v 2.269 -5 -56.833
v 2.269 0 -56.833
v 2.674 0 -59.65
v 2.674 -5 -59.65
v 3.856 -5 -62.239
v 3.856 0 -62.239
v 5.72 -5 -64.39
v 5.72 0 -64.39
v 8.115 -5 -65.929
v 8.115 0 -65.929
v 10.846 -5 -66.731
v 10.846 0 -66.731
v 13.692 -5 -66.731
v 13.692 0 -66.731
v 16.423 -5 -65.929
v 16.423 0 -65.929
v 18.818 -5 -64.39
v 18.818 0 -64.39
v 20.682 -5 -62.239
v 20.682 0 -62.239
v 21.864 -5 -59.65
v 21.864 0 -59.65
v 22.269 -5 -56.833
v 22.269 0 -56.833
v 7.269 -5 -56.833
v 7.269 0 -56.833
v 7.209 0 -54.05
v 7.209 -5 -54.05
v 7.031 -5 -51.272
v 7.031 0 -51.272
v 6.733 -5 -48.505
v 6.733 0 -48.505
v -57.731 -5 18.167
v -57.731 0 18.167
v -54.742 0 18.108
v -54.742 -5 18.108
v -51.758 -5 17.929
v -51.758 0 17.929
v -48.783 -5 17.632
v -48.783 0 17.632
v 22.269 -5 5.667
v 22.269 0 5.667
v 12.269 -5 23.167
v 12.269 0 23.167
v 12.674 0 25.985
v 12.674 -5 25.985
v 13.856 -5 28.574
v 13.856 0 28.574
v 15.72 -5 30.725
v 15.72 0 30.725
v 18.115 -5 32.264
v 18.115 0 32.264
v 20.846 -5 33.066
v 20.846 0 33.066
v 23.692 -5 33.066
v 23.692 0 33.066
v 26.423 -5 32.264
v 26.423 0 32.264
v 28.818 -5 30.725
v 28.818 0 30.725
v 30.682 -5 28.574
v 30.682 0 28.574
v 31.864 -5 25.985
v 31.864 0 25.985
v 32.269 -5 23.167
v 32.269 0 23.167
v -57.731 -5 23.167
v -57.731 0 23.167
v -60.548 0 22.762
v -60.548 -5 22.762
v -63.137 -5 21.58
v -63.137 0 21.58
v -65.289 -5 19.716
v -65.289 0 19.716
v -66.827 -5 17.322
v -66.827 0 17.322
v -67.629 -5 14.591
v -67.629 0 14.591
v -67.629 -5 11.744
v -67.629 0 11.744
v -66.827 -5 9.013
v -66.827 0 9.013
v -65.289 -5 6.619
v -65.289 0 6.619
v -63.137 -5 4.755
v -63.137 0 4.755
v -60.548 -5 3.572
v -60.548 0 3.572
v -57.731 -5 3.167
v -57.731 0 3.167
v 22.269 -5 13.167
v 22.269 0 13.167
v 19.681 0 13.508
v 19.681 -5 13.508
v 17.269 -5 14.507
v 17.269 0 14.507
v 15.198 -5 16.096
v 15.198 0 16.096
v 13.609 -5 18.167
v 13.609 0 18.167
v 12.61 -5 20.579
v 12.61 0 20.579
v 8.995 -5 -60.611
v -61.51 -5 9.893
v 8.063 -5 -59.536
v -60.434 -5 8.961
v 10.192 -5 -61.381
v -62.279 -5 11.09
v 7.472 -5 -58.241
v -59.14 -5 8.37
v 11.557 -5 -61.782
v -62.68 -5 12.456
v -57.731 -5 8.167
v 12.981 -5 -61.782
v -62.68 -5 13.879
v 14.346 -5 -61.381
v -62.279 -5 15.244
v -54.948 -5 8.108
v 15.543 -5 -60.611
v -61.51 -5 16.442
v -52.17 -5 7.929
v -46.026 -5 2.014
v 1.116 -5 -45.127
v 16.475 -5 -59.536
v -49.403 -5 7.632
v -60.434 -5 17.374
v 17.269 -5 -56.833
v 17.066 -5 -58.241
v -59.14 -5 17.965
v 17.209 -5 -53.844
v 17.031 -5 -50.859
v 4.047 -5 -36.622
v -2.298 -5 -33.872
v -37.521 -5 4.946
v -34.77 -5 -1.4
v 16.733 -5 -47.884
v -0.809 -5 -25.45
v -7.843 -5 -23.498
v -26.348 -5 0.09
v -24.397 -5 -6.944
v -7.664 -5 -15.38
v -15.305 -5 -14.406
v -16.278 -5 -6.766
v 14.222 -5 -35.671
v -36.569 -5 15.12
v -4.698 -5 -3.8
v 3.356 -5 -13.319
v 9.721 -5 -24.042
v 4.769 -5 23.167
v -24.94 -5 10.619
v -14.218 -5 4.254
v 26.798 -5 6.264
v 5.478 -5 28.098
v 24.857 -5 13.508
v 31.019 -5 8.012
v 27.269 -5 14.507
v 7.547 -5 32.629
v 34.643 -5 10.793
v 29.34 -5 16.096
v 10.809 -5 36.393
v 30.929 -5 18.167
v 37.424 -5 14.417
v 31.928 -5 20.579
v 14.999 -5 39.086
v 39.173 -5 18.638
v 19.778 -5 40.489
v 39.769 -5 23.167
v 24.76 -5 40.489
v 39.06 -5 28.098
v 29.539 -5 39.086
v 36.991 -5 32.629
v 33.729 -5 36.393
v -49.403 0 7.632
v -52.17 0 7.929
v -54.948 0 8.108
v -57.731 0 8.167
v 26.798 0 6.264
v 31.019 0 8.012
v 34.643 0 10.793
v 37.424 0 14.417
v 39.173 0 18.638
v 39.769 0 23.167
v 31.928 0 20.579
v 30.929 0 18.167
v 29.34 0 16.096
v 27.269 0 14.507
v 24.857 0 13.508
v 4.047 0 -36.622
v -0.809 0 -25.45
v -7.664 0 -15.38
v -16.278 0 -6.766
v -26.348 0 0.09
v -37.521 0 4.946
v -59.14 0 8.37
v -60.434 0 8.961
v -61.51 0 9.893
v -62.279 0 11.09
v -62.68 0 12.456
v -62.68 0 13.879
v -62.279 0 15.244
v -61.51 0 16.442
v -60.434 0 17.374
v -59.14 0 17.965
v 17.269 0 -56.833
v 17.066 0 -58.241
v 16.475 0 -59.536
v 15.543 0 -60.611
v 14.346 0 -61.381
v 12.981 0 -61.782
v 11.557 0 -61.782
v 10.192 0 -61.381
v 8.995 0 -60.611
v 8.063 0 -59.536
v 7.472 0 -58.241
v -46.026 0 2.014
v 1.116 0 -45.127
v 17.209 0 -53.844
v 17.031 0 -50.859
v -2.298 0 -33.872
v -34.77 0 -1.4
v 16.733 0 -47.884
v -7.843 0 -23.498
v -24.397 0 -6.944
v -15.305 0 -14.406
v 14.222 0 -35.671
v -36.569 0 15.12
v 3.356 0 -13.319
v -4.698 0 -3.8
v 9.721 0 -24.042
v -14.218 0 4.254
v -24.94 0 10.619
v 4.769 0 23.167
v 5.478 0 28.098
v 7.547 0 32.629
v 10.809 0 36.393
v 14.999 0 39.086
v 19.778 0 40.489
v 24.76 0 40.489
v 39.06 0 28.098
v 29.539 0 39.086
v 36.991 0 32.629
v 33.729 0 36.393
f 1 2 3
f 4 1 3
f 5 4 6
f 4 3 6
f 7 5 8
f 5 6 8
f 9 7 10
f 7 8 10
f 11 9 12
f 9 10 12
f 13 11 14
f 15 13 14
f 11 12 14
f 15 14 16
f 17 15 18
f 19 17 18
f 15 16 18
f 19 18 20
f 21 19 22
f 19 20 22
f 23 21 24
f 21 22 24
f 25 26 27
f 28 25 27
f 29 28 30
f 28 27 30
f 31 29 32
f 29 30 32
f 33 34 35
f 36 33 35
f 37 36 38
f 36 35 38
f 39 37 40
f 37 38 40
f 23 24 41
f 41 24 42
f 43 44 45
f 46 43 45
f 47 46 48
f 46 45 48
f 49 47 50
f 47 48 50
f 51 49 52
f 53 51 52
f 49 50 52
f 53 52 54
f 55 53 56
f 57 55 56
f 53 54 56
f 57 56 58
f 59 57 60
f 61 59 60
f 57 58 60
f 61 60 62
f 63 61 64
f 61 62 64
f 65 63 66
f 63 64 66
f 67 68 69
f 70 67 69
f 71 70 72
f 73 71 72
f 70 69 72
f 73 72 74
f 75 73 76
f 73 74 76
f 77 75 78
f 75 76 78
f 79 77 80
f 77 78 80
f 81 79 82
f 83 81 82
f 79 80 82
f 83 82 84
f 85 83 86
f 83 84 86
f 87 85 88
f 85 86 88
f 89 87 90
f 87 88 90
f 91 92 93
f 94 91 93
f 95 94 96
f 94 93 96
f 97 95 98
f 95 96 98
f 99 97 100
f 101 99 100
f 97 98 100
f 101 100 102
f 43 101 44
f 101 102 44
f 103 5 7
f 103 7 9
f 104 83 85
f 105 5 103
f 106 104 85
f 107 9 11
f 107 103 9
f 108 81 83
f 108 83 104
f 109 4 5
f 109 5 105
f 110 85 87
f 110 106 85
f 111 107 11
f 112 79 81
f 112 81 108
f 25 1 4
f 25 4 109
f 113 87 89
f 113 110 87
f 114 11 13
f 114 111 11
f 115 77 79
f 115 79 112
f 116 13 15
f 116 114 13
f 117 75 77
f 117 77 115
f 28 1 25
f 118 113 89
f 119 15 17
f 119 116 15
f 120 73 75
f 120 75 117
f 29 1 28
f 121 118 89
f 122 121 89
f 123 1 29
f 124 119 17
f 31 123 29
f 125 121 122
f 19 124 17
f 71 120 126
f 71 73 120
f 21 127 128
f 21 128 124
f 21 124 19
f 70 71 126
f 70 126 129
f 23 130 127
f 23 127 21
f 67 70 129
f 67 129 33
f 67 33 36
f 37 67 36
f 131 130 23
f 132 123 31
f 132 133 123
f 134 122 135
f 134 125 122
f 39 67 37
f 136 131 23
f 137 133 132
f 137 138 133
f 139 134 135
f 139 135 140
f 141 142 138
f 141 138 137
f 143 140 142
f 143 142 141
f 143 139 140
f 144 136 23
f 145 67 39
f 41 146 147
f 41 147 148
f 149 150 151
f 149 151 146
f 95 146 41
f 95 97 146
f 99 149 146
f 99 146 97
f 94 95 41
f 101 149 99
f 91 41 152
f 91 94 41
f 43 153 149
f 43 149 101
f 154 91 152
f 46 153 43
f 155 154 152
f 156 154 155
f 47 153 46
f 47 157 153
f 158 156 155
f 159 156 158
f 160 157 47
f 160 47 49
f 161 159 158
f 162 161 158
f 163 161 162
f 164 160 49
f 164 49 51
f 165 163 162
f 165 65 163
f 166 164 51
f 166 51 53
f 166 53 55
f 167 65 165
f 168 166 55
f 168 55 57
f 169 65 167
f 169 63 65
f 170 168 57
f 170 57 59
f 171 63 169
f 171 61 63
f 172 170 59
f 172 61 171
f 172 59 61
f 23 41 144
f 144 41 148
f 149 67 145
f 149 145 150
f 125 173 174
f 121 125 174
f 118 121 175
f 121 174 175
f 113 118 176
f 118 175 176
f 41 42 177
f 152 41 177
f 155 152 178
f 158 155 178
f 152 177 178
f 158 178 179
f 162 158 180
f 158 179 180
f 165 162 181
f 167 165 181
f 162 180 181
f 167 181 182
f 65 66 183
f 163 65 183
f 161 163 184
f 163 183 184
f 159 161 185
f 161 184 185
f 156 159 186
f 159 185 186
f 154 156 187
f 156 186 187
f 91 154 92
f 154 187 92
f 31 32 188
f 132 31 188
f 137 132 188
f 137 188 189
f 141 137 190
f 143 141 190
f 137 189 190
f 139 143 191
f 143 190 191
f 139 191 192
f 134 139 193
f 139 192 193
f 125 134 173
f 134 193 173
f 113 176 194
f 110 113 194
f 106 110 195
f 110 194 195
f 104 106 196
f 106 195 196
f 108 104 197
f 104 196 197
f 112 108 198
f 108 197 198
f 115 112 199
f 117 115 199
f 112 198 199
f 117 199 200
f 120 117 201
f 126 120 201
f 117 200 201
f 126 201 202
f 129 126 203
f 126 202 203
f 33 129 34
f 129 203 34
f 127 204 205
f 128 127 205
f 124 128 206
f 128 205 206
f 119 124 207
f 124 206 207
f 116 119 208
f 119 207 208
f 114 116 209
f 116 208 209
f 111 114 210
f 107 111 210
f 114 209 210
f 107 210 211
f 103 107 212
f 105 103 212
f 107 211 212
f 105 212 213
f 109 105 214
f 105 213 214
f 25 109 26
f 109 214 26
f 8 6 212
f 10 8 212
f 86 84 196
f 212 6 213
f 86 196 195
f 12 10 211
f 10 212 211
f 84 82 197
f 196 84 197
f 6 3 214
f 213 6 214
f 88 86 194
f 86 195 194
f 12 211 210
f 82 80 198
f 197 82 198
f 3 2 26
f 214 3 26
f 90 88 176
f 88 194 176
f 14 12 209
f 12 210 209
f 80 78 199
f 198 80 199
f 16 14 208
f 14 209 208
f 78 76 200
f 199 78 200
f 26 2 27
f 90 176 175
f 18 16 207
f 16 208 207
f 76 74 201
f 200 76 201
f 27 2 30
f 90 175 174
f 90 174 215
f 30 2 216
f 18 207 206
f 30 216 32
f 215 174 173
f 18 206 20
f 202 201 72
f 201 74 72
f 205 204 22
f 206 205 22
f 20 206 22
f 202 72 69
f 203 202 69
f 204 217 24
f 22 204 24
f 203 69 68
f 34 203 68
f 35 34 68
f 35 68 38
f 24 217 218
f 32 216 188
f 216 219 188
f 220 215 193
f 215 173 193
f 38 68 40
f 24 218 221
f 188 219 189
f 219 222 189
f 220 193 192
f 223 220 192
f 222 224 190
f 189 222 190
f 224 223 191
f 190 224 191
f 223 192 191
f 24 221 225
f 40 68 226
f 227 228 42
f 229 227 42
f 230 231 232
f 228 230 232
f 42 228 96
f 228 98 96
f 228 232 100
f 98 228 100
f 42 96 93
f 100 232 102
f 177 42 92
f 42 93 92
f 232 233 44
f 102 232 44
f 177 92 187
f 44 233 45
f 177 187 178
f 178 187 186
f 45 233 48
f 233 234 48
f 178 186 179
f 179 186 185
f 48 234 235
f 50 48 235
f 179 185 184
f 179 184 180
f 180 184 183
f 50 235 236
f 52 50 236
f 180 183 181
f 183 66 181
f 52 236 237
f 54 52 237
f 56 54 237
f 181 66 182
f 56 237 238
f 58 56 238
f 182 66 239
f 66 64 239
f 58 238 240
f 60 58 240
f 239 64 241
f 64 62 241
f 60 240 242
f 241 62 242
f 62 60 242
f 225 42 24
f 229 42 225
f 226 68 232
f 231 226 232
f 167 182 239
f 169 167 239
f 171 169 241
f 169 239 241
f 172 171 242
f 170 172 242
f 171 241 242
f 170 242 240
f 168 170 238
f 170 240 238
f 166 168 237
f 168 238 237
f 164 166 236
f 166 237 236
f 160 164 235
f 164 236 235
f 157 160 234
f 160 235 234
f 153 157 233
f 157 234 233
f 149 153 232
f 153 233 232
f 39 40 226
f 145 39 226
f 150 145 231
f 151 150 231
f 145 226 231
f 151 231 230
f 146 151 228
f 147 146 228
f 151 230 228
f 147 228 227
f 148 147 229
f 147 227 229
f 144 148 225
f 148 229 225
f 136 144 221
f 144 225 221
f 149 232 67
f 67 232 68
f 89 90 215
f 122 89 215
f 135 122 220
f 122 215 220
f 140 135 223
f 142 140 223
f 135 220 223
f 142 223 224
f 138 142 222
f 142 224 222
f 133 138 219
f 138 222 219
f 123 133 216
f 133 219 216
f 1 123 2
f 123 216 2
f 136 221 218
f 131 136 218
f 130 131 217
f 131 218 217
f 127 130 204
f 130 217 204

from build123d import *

# Parameters (mm, degrees)
F1_DEPTH = 5


with BuildPart() as f1:
    # F0 (on Front) → F1 (new body)
    with BuildSketch(Plane.XZ):
        with BuildLine():
            ThreePointArc((22.2689937055, 5.6673698127), (9.8946250347, 10.793001142), (4.7689937055, 23.1673698127))
            Line((4.7689937055, 23.1673698127), (-57.7310062945, 23.1673698127))
            ThreePointArc((-57.7310062945, 23.1673698127), (-52.4699634864, 21.6715704554), (-48.7828135685, 17.631655527))
            ThreePointArc((-48.7828135685, 17.631655527), (-4.6979977055, -3.7996215983), (16.7332794198, -47.8844374613))
            ThreePointArc((16.7332794198, -47.8844374613), (20.7731943482, -51.5715873792), (22.2689937055, -56.8326301873))
            Line((22.2689937055, -56.8326301873), (22.2689937055, 5.6673698127))
        make_face()
        with BuildLine():
            ThreePointArc((-49.4029892828, 7.631655527), (-53.0064503819, 4.3538250418), (-57.7310062945, 3.1673698127))
            ThreePointArc((-57.7310062945, 3.1673698127), (-15.3045994233, -14.4062233161), (2.2689937055, -56.8326301873))
            ThreePointArc((2.2689937055, -56.8326301873), (3.4554489346, -52.1080742747), (6.7332794198, -48.5046131756))
            ThreePointArc((6.7332794198, -48.5046131756), (-11.7690655174, -10.8706894101), (-49.4029892828, 7.631655527))
        make_face()
        with BuildLine():
            ThreePointArc((6.7332794198, -48.5046131756), (3.4554489346, -52.1080742747), (2.2689937055, -56.8326301873))
            Line((2.2689937055, -56.8326301873), (7.2689937055, -56.8326301873))
            ThreePointArc((7.2689937055, -56.8326301873), (7.1349268732, -52.6600153853), (6.7332794198, -48.5046131756))
        make_face()
        with BuildLine():
            ThreePointArc((2.2689937055, -56.8326301873), (12.2689937055, -66.8326301873), (22.2689937055, -56.8326301873))
            Line((22.2689937055, -56.8326301873), (17.2689937055, -56.8326301873))
            ThreePointArc((17.2689937055, -56.8326301873), (12.2689937055, -61.8326301873), (7.2689937055, -56.8326301873))
            Line((7.2689937055, -56.8326301873), (2.2689937055, -56.8326301873))
        make_face()
        with BuildLine():
            Line((17.2689937055, -56.8326301873), (22.2689937055, -56.8326301873))
            ThreePointArc((22.2689937055, -56.8326301873), (20.7731943482, -51.5715873792), (16.7332794198, -47.8844374613))
            ThreePointArc((16.7332794198, -47.8844374613), (17.134945341, -52.3505229023), (17.2689937055, -56.8326301873))
        make_face()
        with BuildLine():
            Line((-57.7310062945, 18.1673698127), (-57.7310062945, 23.1673698127))
            ThreePointArc((-57.7310062945, 23.1673698127), (-67.7310062945, 13.1673698127), (-57.7310062945, 3.1673698127))
            Line((-57.7310062945, 3.1673698127), (-57.7310062945, 8.1673698127))
            ThreePointArc((-57.7310062945, 8.1673698127), (-62.7310062945, 13.1673698127), (-57.7310062945, 18.1673698127))
        make_face()
        with BuildLine():
            ThreePointArc((-48.7828135685, 17.631655527), (-52.4699634864, 21.6715704554), (-57.7310062945, 23.1673698127))
            Line((-57.7310062945, 23.1673698127), (-57.7310062945, 18.1673698127))
            ThreePointArc((-57.7310062945, 18.1673698127), (-53.2488990095, 18.0333214482), (-48.7828135685, 17.631655527))
        make_face()
        with BuildLine():
            Line((-57.7310062945, 8.1673698127), (-57.7310062945, 3.1673698127))
            ThreePointArc((-57.7310062945, 3.1673698127), (-53.0064503819, 4.3538250418), (-49.4029892828, 7.631655527))
            ThreePointArc((-49.4029892828, 7.631655527), (-53.5583914925, 8.0333029804), (-57.7310062945, 8.1673698127))
        make_face()
        with BuildLine():
            Line((12.2689937055, 23.1673698127), (4.7689937055, 23.1673698127))
            ThreePointArc((4.7689937055, 23.1673698127), (9.8946250347, 10.793001142), (22.2689937055, 5.6673698127))
            Line((22.2689937055, 5.6673698127), (22.2689937055, 13.1673698127))
            ThreePointArc((22.2689937055, 13.1673698127), (15.1979258936, 16.0963020009), (12.2689937055, 23.1673698127))
        make_face()
        with BuildLine():
            ThreePointArc((22.2689937055, 5.6673698127), (34.6433623763, 10.793001142), (39.7689937055, 23.1673698127))
            ThreePointArc((39.7689937055, 23.1673698127), (22.2689937055, 40.6673698127), (4.7689937055, 23.1673698127))
            Line((4.7689937055, 23.1673698127), (12.2689937055, 23.1673698127))
            ThreePointArc((12.2689937055, 23.1673698127), (22.2689937055, 33.1673698127), (32.2689937055, 23.1673698127))
            ThreePointArc((32.2689937055, 23.1673698127), (29.3400615174, 16.0963020009), (22.2689937055, 13.1673698127))
            Line((22.2689937055, 13.1673698127), (22.2689937055, 5.6673698127))
        make_face()
    extrude(amount=F1_DEPTH)


solid = f1.part
